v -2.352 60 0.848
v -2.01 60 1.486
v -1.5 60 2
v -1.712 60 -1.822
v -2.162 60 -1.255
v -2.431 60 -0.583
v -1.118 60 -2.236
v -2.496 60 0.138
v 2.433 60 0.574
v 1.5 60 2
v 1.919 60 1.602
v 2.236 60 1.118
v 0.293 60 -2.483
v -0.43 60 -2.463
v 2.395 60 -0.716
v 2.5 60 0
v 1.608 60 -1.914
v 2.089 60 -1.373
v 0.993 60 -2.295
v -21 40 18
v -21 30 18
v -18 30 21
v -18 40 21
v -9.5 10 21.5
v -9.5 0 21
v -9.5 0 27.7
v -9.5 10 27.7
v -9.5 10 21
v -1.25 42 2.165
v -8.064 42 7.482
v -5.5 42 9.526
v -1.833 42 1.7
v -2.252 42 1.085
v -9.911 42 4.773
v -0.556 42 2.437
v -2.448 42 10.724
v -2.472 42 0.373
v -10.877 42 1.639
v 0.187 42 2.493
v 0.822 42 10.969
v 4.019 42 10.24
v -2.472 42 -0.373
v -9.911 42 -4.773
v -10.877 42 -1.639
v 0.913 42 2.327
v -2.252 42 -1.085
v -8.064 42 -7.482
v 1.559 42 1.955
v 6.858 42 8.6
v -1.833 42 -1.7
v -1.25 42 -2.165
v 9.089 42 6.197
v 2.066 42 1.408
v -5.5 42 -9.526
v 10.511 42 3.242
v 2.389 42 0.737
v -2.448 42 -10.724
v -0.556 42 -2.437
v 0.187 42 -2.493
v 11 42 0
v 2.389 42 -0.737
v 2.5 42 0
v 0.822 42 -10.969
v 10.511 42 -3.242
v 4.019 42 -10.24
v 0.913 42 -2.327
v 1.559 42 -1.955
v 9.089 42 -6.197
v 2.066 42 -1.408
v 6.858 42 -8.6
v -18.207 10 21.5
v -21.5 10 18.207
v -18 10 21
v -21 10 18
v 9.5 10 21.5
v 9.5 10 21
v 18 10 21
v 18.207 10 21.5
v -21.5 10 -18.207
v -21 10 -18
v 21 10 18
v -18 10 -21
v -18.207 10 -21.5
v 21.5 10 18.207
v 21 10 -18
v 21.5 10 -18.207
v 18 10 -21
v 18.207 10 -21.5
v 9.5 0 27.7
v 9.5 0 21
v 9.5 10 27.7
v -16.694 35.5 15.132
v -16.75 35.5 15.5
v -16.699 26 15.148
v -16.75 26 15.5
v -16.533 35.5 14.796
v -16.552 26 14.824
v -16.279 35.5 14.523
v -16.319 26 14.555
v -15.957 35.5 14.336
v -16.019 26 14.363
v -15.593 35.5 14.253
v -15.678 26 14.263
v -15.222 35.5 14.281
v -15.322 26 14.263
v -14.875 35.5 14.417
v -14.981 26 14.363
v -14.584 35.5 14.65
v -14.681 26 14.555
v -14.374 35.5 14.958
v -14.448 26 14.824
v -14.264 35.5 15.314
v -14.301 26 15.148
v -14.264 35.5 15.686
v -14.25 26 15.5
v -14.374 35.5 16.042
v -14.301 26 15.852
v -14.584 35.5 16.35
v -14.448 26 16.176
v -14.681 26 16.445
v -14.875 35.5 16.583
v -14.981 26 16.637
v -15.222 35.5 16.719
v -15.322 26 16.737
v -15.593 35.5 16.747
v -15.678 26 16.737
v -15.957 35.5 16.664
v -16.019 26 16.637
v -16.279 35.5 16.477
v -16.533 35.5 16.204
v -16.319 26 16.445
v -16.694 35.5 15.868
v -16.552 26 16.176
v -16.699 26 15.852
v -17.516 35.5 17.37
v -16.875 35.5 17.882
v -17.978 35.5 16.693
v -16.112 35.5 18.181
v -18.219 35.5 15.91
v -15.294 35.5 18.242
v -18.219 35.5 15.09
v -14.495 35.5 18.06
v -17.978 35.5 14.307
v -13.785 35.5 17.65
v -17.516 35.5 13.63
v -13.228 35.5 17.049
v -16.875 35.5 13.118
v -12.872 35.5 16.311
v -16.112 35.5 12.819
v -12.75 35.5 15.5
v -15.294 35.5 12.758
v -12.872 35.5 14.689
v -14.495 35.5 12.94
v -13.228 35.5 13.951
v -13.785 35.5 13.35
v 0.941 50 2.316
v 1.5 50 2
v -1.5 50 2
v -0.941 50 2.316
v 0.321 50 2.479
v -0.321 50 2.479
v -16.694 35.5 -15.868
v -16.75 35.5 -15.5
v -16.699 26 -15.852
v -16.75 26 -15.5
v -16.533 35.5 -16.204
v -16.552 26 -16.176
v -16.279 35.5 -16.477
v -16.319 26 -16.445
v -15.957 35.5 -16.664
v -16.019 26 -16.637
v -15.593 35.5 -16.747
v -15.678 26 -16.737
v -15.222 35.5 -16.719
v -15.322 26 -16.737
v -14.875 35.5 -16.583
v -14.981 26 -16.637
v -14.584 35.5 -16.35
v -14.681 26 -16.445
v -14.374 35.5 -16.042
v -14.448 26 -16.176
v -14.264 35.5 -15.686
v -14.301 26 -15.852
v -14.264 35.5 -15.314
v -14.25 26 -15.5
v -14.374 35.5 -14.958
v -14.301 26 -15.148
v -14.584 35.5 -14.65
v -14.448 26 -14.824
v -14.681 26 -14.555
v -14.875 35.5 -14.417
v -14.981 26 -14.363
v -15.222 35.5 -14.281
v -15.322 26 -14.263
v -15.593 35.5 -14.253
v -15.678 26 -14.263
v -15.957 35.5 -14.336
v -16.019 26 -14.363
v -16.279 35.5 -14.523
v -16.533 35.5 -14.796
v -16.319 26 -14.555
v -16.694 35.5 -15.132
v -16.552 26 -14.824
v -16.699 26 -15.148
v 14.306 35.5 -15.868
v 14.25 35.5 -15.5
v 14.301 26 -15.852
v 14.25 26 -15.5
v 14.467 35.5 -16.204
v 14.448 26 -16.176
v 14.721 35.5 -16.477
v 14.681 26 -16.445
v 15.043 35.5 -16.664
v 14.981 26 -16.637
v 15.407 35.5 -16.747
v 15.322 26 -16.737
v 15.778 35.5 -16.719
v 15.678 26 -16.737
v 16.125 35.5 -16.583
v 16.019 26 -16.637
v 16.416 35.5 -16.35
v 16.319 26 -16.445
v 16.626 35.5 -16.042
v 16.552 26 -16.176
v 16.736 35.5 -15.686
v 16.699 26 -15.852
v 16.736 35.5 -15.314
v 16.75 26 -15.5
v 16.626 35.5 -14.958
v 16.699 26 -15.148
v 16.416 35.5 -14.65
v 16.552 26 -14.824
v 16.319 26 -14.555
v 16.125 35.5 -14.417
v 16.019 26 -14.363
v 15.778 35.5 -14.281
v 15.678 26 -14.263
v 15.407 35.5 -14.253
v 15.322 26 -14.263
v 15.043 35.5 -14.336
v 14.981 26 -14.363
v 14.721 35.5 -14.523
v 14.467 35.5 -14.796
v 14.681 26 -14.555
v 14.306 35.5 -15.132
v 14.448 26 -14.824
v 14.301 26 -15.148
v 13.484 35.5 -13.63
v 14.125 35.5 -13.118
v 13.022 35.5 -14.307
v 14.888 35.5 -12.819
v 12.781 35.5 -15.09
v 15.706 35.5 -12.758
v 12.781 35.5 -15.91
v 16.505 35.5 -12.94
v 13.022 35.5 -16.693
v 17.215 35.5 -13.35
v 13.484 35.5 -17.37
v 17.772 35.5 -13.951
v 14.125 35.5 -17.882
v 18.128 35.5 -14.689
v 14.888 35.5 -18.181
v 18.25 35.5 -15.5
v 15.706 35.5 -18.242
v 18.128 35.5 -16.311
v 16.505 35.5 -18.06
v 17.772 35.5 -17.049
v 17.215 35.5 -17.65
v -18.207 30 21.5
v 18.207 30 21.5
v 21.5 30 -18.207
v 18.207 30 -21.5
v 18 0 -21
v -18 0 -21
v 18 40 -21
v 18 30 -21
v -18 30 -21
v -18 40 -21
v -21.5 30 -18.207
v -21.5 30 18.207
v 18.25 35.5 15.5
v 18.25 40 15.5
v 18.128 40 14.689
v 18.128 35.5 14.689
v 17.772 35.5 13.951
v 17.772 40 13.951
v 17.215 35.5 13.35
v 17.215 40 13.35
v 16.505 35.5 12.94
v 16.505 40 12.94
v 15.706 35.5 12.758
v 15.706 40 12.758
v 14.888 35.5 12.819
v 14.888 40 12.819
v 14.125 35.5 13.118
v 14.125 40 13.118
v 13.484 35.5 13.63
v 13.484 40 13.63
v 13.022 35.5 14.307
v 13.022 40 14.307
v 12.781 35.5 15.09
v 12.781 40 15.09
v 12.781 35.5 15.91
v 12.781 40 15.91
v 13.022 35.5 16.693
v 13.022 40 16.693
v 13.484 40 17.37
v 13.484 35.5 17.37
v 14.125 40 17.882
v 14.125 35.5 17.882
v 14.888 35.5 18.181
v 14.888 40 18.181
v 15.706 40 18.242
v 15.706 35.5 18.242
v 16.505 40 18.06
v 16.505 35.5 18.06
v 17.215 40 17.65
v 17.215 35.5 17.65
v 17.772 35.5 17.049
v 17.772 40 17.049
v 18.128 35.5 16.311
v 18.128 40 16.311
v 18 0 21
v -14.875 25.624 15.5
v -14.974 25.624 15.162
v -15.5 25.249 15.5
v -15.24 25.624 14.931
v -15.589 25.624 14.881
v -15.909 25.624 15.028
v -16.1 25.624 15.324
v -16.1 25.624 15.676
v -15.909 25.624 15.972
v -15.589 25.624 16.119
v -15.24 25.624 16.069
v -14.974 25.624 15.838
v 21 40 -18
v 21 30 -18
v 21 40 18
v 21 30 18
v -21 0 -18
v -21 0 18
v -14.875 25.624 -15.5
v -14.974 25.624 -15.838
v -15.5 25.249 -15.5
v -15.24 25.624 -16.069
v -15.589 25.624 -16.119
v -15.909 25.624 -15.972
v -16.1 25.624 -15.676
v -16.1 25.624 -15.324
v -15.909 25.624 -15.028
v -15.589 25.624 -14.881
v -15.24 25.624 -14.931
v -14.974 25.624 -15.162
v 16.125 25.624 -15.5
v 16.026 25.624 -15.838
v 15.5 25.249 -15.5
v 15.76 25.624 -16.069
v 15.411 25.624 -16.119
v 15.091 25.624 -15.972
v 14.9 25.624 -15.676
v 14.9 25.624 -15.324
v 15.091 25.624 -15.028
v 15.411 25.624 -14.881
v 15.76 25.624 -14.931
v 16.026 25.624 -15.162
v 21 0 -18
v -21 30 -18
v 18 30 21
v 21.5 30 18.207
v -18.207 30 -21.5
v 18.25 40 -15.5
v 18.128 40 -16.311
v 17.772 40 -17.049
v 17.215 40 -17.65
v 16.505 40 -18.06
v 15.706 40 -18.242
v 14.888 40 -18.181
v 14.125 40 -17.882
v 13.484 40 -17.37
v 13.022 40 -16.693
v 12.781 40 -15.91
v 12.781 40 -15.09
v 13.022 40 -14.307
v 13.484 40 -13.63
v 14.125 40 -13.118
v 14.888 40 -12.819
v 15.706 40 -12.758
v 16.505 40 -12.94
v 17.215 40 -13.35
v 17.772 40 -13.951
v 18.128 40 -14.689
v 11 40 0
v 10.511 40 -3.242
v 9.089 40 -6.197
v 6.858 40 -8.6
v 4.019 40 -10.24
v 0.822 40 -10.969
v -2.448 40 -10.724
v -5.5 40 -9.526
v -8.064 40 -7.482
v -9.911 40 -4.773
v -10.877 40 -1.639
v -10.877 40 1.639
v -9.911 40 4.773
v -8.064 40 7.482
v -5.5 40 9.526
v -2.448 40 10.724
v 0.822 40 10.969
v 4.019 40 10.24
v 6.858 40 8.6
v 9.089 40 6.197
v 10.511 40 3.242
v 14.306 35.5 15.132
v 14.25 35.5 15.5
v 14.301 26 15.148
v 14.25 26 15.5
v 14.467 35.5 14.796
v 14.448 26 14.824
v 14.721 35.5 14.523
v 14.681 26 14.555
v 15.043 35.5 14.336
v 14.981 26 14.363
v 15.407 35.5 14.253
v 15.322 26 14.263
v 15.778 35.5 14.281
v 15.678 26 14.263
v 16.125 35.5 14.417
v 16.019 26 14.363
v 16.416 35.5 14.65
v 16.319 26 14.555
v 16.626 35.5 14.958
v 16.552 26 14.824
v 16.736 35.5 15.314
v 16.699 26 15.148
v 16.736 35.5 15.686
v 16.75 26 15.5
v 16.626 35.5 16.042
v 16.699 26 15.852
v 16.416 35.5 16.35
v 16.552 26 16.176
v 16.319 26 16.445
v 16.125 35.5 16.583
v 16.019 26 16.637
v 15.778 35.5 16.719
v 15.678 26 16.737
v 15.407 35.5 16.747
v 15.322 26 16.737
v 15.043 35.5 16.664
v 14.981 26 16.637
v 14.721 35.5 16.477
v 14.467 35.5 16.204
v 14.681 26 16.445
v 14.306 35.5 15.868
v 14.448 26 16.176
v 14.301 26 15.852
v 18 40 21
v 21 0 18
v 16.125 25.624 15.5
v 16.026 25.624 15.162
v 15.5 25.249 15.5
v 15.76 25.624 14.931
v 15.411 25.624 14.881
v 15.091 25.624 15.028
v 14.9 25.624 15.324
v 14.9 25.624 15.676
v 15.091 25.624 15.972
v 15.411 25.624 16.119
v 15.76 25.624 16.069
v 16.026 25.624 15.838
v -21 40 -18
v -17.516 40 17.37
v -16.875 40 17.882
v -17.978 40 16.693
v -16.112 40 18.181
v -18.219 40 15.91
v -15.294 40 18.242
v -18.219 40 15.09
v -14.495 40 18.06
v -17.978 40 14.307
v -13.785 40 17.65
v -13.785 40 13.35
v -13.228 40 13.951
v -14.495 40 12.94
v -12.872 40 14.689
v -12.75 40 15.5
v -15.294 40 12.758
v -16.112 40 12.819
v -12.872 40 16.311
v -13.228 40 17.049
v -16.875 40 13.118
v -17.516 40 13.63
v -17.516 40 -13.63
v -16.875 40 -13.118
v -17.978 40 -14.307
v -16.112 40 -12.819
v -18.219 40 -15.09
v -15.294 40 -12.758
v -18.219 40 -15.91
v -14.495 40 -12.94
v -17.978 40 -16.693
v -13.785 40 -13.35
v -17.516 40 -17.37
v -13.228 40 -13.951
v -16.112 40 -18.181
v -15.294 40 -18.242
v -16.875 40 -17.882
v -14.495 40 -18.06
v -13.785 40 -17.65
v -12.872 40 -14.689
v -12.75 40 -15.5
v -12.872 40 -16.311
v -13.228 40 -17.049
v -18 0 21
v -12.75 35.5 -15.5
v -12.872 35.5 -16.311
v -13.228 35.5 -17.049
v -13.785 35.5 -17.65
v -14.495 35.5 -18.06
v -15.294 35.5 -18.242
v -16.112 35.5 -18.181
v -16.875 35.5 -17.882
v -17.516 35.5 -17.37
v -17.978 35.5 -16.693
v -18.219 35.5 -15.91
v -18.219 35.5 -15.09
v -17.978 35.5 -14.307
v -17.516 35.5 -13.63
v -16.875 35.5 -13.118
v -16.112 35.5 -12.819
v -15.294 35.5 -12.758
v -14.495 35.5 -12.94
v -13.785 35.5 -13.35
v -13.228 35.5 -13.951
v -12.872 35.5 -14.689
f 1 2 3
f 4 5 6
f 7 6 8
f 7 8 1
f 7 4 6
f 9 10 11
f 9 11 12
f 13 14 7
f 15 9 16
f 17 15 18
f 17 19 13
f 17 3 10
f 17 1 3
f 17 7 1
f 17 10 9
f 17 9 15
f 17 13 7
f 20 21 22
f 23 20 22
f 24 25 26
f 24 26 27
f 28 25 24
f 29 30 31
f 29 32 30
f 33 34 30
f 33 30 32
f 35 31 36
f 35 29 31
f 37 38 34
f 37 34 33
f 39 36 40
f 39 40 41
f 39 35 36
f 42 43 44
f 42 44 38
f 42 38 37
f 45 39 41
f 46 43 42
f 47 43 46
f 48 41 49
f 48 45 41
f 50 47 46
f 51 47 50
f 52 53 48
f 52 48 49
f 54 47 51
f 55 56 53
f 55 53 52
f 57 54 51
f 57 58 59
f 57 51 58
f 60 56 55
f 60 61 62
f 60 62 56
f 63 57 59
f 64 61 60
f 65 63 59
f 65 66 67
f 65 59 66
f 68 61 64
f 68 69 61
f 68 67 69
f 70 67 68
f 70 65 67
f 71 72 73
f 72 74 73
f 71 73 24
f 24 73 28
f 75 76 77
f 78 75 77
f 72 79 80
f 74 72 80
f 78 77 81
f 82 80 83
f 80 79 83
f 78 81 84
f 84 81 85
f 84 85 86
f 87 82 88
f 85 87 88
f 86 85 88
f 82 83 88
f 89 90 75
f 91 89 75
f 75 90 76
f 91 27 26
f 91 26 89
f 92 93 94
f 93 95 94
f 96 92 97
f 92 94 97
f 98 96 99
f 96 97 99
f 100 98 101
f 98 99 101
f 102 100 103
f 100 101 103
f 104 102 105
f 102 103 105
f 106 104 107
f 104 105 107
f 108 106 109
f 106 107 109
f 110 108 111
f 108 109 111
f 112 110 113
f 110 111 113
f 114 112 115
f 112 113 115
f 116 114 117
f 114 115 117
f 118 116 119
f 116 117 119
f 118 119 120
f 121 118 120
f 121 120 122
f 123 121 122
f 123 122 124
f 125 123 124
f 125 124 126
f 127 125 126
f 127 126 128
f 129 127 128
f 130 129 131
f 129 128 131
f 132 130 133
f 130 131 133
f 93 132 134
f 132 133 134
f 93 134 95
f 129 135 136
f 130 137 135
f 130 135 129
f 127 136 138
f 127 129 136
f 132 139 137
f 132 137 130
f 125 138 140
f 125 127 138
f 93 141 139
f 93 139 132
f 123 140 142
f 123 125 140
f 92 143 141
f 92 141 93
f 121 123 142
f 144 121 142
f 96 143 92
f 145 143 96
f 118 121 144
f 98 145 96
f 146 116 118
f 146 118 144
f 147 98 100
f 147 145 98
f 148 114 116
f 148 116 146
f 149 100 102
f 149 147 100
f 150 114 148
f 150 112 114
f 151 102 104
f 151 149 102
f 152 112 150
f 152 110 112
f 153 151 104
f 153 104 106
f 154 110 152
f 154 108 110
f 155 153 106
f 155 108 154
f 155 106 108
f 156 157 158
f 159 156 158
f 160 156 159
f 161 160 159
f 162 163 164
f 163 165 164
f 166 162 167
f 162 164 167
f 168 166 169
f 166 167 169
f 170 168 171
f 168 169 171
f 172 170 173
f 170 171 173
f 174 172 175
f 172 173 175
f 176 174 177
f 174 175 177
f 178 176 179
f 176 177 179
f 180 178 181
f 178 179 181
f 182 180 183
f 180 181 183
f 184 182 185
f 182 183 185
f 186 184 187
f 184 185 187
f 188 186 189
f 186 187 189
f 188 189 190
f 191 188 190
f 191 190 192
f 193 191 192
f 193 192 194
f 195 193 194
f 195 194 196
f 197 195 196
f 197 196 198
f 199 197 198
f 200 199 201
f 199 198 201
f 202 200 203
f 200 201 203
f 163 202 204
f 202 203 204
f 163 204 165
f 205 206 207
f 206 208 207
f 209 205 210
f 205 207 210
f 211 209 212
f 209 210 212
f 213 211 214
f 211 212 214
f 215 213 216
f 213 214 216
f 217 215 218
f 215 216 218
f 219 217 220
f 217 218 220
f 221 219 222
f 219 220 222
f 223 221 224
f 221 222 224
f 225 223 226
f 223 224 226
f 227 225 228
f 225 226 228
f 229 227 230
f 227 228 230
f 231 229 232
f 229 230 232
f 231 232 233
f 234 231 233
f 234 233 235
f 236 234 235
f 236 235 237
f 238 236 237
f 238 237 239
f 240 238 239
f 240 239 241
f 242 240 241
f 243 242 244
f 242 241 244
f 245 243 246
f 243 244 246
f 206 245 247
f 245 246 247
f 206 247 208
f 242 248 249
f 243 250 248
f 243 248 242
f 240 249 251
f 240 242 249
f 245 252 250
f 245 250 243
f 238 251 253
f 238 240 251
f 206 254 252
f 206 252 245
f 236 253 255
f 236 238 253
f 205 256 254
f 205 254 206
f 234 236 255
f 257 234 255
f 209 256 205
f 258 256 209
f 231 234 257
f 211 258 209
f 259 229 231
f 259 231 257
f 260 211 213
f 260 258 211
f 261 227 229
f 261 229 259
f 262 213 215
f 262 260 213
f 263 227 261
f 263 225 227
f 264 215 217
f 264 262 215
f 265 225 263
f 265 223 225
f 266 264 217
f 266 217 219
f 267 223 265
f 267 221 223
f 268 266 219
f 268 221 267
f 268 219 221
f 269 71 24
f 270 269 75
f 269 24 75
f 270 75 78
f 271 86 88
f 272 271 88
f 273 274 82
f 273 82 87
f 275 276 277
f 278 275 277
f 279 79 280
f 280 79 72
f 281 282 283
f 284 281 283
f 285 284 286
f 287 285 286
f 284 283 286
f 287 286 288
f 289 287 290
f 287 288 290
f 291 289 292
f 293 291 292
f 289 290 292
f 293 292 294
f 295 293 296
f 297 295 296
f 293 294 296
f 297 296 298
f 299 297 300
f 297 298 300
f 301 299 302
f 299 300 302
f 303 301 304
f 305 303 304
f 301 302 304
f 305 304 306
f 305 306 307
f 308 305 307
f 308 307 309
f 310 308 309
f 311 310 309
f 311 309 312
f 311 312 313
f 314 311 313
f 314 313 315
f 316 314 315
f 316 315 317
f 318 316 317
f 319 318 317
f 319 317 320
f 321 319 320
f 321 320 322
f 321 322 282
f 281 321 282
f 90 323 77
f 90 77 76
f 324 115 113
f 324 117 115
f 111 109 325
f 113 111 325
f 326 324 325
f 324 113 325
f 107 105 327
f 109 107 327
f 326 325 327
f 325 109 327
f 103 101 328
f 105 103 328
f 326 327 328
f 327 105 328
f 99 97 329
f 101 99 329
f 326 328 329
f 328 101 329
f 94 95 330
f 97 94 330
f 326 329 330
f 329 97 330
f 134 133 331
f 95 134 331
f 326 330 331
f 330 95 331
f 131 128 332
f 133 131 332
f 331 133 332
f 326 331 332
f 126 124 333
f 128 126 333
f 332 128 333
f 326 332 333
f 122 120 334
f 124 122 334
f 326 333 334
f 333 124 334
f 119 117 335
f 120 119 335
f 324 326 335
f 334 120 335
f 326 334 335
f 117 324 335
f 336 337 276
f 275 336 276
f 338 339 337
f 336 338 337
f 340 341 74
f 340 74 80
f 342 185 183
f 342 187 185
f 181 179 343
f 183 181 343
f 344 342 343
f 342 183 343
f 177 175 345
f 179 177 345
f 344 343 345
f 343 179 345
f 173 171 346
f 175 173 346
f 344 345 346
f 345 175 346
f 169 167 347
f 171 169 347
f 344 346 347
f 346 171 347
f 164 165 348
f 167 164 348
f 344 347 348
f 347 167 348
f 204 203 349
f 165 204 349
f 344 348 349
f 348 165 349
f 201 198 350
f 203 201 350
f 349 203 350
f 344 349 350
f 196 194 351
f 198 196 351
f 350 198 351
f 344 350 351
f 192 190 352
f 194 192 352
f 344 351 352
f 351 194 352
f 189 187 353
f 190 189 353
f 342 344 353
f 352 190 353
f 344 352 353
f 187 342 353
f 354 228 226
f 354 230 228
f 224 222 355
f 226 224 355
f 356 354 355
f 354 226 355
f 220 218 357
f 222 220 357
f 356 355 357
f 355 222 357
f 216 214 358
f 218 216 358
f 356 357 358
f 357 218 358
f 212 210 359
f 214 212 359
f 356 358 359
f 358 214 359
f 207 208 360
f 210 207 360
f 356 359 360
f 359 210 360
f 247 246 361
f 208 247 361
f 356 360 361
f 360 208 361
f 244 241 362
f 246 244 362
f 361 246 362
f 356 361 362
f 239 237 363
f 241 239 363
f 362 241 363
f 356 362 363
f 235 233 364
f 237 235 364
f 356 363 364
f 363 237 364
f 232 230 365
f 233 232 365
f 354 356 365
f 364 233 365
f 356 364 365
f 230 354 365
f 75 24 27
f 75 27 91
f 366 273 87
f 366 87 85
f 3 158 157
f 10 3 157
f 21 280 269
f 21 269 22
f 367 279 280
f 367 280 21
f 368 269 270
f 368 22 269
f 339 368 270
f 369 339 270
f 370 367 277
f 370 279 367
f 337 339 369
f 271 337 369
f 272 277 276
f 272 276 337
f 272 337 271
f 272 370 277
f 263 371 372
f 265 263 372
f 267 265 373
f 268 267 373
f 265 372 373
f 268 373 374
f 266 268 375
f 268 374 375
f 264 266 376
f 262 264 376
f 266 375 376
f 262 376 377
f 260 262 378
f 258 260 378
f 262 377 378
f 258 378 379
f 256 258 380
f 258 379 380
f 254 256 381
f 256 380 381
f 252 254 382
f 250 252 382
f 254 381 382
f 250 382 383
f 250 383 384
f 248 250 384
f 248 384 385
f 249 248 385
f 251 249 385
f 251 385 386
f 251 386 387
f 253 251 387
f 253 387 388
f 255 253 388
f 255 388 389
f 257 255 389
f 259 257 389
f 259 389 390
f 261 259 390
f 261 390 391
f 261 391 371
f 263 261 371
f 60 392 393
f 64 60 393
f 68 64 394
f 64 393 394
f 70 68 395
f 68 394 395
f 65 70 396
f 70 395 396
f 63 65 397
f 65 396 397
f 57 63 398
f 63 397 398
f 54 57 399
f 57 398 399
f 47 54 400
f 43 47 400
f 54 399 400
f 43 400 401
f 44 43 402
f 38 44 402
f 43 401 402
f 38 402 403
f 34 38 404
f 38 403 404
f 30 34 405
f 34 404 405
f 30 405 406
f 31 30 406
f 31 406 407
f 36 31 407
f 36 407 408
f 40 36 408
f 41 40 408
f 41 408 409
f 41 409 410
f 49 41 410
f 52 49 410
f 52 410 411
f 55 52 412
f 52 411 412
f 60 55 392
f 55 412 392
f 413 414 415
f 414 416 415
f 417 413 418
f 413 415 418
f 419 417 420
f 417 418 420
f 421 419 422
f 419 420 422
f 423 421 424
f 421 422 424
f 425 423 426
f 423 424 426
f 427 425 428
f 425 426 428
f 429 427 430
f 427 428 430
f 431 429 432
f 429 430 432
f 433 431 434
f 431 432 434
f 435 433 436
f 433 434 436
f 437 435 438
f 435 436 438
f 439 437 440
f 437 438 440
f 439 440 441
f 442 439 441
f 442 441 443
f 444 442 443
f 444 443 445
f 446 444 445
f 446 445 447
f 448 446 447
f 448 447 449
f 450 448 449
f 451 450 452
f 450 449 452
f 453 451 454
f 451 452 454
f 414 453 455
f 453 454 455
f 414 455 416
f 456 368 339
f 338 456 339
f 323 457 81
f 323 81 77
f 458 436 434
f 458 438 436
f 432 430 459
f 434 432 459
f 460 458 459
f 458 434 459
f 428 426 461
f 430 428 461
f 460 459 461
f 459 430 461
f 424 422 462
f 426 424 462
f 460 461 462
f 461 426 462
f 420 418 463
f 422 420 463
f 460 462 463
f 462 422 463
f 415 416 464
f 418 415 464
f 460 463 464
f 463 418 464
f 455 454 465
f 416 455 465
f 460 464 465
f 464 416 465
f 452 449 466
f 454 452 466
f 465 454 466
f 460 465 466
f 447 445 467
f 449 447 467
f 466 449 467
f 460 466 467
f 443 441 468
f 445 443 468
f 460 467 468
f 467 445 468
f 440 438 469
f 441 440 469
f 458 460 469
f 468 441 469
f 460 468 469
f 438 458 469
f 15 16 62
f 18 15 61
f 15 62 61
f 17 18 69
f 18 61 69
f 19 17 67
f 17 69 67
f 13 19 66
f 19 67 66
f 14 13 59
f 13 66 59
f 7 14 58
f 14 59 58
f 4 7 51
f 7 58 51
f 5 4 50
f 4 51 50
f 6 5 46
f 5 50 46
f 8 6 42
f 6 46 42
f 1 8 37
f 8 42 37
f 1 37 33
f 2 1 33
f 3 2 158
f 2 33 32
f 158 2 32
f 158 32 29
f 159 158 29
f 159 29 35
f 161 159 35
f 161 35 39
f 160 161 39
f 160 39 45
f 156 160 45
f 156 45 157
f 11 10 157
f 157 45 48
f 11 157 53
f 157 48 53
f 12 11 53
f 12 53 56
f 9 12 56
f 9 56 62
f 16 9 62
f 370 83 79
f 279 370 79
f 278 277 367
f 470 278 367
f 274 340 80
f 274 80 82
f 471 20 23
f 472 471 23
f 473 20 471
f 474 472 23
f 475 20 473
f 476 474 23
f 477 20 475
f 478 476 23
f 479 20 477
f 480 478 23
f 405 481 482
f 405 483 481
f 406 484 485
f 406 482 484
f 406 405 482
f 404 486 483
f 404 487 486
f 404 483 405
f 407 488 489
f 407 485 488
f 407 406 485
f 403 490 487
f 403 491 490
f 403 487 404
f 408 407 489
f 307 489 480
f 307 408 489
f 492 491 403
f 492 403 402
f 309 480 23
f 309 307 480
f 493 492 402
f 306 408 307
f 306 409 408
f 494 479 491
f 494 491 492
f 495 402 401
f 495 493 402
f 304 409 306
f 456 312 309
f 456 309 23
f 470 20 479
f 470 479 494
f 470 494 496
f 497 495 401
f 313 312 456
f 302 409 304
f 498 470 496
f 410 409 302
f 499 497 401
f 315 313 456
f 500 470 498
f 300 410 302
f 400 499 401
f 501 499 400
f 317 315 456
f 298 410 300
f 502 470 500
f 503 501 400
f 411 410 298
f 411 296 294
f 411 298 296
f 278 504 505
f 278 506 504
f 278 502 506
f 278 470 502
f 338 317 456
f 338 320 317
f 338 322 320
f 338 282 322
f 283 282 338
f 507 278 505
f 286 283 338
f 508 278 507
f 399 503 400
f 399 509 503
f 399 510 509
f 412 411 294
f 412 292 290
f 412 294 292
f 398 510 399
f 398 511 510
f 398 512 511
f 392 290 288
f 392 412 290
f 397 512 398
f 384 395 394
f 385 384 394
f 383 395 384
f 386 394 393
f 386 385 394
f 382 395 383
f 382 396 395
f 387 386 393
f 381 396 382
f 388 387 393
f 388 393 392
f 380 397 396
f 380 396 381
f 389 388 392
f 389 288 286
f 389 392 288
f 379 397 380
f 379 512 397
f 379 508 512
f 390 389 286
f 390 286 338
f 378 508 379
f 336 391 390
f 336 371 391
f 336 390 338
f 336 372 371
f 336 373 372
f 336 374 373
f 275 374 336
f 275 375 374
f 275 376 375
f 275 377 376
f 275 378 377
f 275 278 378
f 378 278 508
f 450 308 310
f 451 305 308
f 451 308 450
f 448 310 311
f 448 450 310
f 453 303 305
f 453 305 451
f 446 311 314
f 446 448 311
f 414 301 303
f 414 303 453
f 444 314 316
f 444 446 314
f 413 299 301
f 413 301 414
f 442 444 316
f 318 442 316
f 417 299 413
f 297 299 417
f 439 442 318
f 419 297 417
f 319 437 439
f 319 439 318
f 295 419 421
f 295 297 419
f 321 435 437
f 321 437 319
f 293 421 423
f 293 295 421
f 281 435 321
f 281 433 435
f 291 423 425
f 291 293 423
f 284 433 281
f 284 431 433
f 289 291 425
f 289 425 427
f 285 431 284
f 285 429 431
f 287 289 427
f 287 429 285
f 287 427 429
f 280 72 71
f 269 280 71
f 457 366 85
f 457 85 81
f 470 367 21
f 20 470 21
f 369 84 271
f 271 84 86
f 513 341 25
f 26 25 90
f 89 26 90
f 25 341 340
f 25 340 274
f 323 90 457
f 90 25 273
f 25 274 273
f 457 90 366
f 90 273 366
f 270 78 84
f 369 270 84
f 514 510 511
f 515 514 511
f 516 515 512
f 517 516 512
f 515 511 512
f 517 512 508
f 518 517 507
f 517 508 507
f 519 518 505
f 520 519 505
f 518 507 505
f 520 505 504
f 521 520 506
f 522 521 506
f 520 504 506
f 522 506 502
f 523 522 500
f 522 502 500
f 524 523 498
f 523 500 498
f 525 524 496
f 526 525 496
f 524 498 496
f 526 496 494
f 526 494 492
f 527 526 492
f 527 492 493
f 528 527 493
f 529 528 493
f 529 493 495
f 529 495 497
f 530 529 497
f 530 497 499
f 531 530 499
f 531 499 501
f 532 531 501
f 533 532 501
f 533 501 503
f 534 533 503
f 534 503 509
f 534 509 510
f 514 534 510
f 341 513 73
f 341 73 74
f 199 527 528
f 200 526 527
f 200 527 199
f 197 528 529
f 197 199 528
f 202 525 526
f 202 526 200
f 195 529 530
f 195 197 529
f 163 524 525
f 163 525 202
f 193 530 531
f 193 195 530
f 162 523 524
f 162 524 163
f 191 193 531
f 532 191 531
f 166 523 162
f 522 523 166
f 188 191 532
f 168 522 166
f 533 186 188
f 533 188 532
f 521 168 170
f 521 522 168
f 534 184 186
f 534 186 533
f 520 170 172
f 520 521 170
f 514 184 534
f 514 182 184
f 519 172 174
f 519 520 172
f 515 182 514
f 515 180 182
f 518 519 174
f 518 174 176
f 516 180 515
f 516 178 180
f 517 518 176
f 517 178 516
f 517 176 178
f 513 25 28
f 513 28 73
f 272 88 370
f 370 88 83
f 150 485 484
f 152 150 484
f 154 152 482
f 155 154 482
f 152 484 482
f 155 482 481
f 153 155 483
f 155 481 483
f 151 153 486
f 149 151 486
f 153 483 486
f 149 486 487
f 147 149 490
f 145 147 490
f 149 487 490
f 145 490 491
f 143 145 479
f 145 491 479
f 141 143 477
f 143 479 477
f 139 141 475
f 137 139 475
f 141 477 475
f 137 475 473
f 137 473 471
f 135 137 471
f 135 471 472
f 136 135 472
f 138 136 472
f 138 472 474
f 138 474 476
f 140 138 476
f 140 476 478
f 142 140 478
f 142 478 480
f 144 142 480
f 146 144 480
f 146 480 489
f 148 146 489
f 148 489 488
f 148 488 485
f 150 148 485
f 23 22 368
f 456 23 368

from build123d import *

# Parameters (mm, degrees)
EXTRUDE_1_DEPTH              = 10
EXTRUDE_3_DEPTH              = 20
EXTRUDE_4_DEPTH              = 10
SKETCH_4_R                   = 11
EXTRUDE_5_DEPTH              = 2
SKETCH_5_R                   = 2.5
EXTRUDE_6_DEPTH              = 18
SKETCH_6_W                   = 19
SKETCH_6_H                   = 10
EXTRUDE_7_DEPTH              = 6.7
CUT_EXTRUDE_1_DEPTH          = 10
HOLE_WIZARD_M3_1_D           = 2.5
HOLE_WIZARD_M3_1_DEPTH       = 14
HOLE_WIZARD_M3_1_CBORE_D     = 5.5
HOLE_WIZARD_M3_1_CBORE_DEPTH = 4.5
HOLE_WIZARD_M3_1_TIP         = 0.751075774


with BuildPart() as part:
    # 草图1 → 凸台-拉伸1 (new body)
    with BuildSketch(Plane(origin=(0, 0, 0), x_dir=(1, 0, 0), z_dir=(0, 1, 0))):
        Polygon((-21, 18), (-18, 21), (18, 21), (21, 18), (21, -18), (18, -21), (-18, -21), (-21, -18), align=None)
    extrude(amount=EXTRUDE_1_DEPTH)

    # 草图2 → 凸台-拉伸3 (add)
    with BuildSketch(Plane(origin=(0, 10, 0), x_dir=(1, 0, 0), z_dir=(0, 1, 0))):
        Polygon((21.5, 18.207106781), (18.207106781, 21.5), (-18.207106781, 21.5), (-21.5, 18.207106781), (-21.5, -18.207106781), (-18.207106781, -21.5), (18.207106781, -21.5), (21.5, -18.207106781), align=None)
    extrude(amount=EXTRUDE_3_DEPTH)

    # 草图3 → 凸台-拉伸4 (add)
    with BuildSketch(Plane(origin=(0, 30, 0), x_dir=(1, 0, 0), z_dir=(0, 1, 0))):
        Polygon((21, -18), (21, 18), (18, 21), (-18, 21), (-21, 18), (-21, -18), (-18, -21), (18, -21), align=None)
    extrude(amount=EXTRUDE_4_DEPTH)

    # 草图4 → 凸台-拉伸5 (add)
    with BuildSketch(Plane(origin=(0, 40, 0), x_dir=(1, 0, 0), z_dir=(0, 1, 0))):
        Circle(SKETCH_4_R)
    extrude(amount=EXTRUDE_5_DEPTH)

    # 草图5 → 凸台-拉伸6 (add)
    with BuildSketch(Plane(origin=(0, 42, 0), x_dir=(1, 0, 0), z_dir=(0, 1, 0))):
        Circle(SKETCH_5_R)
    extrude(amount=EXTRUDE_6_DEPTH)

    # 草图6 → 凸台-拉伸7 (add)
    with BuildSketch(Plane.XY.offset(21)):
        with Locations((0, 5)):
            Rectangle(SKETCH_6_W, SKETCH_6_H)
    extrude(amount=EXTRUDE_7_DEPTH)

    # 草图7 → 切除-拉伸1 (cut)
    with BuildSketch(Plane(origin=(0, 60, 0), x_dir=(1, 0, 0), z_dir=(0, 1, 0))):
        with BuildLine():
            Line((-1.5, -2), (1.5, -2))
            ThreePointArc((1.5, -2), (0, -2.5), (-1.5, -2))
        make_face()
    extrude(amount=-CUT_EXTRUDE_1_DEPTH, mode=Mode.SUBTRACT)

    # M3 六角头机械螺钉的柱形沉头孔1
    with Locations(Plane(origin=(0, 40, 0), x_dir=(1, 0, 0), z_dir=(0, 1, 0))):
        with Locations((-15.5, 15.5), (15.5, 15.5), (-15.5, -15.5), (15.5, -15.5)):
            CounterBoreHole(HOLE_WIZARD_M3_1_D / 2, HOLE_WIZARD_M3_1_CBORE_D / 2, HOLE_WIZARD_M3_1_CBORE_DEPTH, depth=HOLE_WIZARD_M3_1_DEPTH)
            with Locations((0, 0, -(HOLE_WIZARD_M3_1_DEPTH + HOLE_WIZARD_M3_1_TIP / 2))):  # 118° drill point
                Cone(0, HOLE_WIZARD_M3_1_D / 2, HOLE_WIZARD_M3_1_TIP, mode=Mode.SUBTRACT)


solid = part.part
